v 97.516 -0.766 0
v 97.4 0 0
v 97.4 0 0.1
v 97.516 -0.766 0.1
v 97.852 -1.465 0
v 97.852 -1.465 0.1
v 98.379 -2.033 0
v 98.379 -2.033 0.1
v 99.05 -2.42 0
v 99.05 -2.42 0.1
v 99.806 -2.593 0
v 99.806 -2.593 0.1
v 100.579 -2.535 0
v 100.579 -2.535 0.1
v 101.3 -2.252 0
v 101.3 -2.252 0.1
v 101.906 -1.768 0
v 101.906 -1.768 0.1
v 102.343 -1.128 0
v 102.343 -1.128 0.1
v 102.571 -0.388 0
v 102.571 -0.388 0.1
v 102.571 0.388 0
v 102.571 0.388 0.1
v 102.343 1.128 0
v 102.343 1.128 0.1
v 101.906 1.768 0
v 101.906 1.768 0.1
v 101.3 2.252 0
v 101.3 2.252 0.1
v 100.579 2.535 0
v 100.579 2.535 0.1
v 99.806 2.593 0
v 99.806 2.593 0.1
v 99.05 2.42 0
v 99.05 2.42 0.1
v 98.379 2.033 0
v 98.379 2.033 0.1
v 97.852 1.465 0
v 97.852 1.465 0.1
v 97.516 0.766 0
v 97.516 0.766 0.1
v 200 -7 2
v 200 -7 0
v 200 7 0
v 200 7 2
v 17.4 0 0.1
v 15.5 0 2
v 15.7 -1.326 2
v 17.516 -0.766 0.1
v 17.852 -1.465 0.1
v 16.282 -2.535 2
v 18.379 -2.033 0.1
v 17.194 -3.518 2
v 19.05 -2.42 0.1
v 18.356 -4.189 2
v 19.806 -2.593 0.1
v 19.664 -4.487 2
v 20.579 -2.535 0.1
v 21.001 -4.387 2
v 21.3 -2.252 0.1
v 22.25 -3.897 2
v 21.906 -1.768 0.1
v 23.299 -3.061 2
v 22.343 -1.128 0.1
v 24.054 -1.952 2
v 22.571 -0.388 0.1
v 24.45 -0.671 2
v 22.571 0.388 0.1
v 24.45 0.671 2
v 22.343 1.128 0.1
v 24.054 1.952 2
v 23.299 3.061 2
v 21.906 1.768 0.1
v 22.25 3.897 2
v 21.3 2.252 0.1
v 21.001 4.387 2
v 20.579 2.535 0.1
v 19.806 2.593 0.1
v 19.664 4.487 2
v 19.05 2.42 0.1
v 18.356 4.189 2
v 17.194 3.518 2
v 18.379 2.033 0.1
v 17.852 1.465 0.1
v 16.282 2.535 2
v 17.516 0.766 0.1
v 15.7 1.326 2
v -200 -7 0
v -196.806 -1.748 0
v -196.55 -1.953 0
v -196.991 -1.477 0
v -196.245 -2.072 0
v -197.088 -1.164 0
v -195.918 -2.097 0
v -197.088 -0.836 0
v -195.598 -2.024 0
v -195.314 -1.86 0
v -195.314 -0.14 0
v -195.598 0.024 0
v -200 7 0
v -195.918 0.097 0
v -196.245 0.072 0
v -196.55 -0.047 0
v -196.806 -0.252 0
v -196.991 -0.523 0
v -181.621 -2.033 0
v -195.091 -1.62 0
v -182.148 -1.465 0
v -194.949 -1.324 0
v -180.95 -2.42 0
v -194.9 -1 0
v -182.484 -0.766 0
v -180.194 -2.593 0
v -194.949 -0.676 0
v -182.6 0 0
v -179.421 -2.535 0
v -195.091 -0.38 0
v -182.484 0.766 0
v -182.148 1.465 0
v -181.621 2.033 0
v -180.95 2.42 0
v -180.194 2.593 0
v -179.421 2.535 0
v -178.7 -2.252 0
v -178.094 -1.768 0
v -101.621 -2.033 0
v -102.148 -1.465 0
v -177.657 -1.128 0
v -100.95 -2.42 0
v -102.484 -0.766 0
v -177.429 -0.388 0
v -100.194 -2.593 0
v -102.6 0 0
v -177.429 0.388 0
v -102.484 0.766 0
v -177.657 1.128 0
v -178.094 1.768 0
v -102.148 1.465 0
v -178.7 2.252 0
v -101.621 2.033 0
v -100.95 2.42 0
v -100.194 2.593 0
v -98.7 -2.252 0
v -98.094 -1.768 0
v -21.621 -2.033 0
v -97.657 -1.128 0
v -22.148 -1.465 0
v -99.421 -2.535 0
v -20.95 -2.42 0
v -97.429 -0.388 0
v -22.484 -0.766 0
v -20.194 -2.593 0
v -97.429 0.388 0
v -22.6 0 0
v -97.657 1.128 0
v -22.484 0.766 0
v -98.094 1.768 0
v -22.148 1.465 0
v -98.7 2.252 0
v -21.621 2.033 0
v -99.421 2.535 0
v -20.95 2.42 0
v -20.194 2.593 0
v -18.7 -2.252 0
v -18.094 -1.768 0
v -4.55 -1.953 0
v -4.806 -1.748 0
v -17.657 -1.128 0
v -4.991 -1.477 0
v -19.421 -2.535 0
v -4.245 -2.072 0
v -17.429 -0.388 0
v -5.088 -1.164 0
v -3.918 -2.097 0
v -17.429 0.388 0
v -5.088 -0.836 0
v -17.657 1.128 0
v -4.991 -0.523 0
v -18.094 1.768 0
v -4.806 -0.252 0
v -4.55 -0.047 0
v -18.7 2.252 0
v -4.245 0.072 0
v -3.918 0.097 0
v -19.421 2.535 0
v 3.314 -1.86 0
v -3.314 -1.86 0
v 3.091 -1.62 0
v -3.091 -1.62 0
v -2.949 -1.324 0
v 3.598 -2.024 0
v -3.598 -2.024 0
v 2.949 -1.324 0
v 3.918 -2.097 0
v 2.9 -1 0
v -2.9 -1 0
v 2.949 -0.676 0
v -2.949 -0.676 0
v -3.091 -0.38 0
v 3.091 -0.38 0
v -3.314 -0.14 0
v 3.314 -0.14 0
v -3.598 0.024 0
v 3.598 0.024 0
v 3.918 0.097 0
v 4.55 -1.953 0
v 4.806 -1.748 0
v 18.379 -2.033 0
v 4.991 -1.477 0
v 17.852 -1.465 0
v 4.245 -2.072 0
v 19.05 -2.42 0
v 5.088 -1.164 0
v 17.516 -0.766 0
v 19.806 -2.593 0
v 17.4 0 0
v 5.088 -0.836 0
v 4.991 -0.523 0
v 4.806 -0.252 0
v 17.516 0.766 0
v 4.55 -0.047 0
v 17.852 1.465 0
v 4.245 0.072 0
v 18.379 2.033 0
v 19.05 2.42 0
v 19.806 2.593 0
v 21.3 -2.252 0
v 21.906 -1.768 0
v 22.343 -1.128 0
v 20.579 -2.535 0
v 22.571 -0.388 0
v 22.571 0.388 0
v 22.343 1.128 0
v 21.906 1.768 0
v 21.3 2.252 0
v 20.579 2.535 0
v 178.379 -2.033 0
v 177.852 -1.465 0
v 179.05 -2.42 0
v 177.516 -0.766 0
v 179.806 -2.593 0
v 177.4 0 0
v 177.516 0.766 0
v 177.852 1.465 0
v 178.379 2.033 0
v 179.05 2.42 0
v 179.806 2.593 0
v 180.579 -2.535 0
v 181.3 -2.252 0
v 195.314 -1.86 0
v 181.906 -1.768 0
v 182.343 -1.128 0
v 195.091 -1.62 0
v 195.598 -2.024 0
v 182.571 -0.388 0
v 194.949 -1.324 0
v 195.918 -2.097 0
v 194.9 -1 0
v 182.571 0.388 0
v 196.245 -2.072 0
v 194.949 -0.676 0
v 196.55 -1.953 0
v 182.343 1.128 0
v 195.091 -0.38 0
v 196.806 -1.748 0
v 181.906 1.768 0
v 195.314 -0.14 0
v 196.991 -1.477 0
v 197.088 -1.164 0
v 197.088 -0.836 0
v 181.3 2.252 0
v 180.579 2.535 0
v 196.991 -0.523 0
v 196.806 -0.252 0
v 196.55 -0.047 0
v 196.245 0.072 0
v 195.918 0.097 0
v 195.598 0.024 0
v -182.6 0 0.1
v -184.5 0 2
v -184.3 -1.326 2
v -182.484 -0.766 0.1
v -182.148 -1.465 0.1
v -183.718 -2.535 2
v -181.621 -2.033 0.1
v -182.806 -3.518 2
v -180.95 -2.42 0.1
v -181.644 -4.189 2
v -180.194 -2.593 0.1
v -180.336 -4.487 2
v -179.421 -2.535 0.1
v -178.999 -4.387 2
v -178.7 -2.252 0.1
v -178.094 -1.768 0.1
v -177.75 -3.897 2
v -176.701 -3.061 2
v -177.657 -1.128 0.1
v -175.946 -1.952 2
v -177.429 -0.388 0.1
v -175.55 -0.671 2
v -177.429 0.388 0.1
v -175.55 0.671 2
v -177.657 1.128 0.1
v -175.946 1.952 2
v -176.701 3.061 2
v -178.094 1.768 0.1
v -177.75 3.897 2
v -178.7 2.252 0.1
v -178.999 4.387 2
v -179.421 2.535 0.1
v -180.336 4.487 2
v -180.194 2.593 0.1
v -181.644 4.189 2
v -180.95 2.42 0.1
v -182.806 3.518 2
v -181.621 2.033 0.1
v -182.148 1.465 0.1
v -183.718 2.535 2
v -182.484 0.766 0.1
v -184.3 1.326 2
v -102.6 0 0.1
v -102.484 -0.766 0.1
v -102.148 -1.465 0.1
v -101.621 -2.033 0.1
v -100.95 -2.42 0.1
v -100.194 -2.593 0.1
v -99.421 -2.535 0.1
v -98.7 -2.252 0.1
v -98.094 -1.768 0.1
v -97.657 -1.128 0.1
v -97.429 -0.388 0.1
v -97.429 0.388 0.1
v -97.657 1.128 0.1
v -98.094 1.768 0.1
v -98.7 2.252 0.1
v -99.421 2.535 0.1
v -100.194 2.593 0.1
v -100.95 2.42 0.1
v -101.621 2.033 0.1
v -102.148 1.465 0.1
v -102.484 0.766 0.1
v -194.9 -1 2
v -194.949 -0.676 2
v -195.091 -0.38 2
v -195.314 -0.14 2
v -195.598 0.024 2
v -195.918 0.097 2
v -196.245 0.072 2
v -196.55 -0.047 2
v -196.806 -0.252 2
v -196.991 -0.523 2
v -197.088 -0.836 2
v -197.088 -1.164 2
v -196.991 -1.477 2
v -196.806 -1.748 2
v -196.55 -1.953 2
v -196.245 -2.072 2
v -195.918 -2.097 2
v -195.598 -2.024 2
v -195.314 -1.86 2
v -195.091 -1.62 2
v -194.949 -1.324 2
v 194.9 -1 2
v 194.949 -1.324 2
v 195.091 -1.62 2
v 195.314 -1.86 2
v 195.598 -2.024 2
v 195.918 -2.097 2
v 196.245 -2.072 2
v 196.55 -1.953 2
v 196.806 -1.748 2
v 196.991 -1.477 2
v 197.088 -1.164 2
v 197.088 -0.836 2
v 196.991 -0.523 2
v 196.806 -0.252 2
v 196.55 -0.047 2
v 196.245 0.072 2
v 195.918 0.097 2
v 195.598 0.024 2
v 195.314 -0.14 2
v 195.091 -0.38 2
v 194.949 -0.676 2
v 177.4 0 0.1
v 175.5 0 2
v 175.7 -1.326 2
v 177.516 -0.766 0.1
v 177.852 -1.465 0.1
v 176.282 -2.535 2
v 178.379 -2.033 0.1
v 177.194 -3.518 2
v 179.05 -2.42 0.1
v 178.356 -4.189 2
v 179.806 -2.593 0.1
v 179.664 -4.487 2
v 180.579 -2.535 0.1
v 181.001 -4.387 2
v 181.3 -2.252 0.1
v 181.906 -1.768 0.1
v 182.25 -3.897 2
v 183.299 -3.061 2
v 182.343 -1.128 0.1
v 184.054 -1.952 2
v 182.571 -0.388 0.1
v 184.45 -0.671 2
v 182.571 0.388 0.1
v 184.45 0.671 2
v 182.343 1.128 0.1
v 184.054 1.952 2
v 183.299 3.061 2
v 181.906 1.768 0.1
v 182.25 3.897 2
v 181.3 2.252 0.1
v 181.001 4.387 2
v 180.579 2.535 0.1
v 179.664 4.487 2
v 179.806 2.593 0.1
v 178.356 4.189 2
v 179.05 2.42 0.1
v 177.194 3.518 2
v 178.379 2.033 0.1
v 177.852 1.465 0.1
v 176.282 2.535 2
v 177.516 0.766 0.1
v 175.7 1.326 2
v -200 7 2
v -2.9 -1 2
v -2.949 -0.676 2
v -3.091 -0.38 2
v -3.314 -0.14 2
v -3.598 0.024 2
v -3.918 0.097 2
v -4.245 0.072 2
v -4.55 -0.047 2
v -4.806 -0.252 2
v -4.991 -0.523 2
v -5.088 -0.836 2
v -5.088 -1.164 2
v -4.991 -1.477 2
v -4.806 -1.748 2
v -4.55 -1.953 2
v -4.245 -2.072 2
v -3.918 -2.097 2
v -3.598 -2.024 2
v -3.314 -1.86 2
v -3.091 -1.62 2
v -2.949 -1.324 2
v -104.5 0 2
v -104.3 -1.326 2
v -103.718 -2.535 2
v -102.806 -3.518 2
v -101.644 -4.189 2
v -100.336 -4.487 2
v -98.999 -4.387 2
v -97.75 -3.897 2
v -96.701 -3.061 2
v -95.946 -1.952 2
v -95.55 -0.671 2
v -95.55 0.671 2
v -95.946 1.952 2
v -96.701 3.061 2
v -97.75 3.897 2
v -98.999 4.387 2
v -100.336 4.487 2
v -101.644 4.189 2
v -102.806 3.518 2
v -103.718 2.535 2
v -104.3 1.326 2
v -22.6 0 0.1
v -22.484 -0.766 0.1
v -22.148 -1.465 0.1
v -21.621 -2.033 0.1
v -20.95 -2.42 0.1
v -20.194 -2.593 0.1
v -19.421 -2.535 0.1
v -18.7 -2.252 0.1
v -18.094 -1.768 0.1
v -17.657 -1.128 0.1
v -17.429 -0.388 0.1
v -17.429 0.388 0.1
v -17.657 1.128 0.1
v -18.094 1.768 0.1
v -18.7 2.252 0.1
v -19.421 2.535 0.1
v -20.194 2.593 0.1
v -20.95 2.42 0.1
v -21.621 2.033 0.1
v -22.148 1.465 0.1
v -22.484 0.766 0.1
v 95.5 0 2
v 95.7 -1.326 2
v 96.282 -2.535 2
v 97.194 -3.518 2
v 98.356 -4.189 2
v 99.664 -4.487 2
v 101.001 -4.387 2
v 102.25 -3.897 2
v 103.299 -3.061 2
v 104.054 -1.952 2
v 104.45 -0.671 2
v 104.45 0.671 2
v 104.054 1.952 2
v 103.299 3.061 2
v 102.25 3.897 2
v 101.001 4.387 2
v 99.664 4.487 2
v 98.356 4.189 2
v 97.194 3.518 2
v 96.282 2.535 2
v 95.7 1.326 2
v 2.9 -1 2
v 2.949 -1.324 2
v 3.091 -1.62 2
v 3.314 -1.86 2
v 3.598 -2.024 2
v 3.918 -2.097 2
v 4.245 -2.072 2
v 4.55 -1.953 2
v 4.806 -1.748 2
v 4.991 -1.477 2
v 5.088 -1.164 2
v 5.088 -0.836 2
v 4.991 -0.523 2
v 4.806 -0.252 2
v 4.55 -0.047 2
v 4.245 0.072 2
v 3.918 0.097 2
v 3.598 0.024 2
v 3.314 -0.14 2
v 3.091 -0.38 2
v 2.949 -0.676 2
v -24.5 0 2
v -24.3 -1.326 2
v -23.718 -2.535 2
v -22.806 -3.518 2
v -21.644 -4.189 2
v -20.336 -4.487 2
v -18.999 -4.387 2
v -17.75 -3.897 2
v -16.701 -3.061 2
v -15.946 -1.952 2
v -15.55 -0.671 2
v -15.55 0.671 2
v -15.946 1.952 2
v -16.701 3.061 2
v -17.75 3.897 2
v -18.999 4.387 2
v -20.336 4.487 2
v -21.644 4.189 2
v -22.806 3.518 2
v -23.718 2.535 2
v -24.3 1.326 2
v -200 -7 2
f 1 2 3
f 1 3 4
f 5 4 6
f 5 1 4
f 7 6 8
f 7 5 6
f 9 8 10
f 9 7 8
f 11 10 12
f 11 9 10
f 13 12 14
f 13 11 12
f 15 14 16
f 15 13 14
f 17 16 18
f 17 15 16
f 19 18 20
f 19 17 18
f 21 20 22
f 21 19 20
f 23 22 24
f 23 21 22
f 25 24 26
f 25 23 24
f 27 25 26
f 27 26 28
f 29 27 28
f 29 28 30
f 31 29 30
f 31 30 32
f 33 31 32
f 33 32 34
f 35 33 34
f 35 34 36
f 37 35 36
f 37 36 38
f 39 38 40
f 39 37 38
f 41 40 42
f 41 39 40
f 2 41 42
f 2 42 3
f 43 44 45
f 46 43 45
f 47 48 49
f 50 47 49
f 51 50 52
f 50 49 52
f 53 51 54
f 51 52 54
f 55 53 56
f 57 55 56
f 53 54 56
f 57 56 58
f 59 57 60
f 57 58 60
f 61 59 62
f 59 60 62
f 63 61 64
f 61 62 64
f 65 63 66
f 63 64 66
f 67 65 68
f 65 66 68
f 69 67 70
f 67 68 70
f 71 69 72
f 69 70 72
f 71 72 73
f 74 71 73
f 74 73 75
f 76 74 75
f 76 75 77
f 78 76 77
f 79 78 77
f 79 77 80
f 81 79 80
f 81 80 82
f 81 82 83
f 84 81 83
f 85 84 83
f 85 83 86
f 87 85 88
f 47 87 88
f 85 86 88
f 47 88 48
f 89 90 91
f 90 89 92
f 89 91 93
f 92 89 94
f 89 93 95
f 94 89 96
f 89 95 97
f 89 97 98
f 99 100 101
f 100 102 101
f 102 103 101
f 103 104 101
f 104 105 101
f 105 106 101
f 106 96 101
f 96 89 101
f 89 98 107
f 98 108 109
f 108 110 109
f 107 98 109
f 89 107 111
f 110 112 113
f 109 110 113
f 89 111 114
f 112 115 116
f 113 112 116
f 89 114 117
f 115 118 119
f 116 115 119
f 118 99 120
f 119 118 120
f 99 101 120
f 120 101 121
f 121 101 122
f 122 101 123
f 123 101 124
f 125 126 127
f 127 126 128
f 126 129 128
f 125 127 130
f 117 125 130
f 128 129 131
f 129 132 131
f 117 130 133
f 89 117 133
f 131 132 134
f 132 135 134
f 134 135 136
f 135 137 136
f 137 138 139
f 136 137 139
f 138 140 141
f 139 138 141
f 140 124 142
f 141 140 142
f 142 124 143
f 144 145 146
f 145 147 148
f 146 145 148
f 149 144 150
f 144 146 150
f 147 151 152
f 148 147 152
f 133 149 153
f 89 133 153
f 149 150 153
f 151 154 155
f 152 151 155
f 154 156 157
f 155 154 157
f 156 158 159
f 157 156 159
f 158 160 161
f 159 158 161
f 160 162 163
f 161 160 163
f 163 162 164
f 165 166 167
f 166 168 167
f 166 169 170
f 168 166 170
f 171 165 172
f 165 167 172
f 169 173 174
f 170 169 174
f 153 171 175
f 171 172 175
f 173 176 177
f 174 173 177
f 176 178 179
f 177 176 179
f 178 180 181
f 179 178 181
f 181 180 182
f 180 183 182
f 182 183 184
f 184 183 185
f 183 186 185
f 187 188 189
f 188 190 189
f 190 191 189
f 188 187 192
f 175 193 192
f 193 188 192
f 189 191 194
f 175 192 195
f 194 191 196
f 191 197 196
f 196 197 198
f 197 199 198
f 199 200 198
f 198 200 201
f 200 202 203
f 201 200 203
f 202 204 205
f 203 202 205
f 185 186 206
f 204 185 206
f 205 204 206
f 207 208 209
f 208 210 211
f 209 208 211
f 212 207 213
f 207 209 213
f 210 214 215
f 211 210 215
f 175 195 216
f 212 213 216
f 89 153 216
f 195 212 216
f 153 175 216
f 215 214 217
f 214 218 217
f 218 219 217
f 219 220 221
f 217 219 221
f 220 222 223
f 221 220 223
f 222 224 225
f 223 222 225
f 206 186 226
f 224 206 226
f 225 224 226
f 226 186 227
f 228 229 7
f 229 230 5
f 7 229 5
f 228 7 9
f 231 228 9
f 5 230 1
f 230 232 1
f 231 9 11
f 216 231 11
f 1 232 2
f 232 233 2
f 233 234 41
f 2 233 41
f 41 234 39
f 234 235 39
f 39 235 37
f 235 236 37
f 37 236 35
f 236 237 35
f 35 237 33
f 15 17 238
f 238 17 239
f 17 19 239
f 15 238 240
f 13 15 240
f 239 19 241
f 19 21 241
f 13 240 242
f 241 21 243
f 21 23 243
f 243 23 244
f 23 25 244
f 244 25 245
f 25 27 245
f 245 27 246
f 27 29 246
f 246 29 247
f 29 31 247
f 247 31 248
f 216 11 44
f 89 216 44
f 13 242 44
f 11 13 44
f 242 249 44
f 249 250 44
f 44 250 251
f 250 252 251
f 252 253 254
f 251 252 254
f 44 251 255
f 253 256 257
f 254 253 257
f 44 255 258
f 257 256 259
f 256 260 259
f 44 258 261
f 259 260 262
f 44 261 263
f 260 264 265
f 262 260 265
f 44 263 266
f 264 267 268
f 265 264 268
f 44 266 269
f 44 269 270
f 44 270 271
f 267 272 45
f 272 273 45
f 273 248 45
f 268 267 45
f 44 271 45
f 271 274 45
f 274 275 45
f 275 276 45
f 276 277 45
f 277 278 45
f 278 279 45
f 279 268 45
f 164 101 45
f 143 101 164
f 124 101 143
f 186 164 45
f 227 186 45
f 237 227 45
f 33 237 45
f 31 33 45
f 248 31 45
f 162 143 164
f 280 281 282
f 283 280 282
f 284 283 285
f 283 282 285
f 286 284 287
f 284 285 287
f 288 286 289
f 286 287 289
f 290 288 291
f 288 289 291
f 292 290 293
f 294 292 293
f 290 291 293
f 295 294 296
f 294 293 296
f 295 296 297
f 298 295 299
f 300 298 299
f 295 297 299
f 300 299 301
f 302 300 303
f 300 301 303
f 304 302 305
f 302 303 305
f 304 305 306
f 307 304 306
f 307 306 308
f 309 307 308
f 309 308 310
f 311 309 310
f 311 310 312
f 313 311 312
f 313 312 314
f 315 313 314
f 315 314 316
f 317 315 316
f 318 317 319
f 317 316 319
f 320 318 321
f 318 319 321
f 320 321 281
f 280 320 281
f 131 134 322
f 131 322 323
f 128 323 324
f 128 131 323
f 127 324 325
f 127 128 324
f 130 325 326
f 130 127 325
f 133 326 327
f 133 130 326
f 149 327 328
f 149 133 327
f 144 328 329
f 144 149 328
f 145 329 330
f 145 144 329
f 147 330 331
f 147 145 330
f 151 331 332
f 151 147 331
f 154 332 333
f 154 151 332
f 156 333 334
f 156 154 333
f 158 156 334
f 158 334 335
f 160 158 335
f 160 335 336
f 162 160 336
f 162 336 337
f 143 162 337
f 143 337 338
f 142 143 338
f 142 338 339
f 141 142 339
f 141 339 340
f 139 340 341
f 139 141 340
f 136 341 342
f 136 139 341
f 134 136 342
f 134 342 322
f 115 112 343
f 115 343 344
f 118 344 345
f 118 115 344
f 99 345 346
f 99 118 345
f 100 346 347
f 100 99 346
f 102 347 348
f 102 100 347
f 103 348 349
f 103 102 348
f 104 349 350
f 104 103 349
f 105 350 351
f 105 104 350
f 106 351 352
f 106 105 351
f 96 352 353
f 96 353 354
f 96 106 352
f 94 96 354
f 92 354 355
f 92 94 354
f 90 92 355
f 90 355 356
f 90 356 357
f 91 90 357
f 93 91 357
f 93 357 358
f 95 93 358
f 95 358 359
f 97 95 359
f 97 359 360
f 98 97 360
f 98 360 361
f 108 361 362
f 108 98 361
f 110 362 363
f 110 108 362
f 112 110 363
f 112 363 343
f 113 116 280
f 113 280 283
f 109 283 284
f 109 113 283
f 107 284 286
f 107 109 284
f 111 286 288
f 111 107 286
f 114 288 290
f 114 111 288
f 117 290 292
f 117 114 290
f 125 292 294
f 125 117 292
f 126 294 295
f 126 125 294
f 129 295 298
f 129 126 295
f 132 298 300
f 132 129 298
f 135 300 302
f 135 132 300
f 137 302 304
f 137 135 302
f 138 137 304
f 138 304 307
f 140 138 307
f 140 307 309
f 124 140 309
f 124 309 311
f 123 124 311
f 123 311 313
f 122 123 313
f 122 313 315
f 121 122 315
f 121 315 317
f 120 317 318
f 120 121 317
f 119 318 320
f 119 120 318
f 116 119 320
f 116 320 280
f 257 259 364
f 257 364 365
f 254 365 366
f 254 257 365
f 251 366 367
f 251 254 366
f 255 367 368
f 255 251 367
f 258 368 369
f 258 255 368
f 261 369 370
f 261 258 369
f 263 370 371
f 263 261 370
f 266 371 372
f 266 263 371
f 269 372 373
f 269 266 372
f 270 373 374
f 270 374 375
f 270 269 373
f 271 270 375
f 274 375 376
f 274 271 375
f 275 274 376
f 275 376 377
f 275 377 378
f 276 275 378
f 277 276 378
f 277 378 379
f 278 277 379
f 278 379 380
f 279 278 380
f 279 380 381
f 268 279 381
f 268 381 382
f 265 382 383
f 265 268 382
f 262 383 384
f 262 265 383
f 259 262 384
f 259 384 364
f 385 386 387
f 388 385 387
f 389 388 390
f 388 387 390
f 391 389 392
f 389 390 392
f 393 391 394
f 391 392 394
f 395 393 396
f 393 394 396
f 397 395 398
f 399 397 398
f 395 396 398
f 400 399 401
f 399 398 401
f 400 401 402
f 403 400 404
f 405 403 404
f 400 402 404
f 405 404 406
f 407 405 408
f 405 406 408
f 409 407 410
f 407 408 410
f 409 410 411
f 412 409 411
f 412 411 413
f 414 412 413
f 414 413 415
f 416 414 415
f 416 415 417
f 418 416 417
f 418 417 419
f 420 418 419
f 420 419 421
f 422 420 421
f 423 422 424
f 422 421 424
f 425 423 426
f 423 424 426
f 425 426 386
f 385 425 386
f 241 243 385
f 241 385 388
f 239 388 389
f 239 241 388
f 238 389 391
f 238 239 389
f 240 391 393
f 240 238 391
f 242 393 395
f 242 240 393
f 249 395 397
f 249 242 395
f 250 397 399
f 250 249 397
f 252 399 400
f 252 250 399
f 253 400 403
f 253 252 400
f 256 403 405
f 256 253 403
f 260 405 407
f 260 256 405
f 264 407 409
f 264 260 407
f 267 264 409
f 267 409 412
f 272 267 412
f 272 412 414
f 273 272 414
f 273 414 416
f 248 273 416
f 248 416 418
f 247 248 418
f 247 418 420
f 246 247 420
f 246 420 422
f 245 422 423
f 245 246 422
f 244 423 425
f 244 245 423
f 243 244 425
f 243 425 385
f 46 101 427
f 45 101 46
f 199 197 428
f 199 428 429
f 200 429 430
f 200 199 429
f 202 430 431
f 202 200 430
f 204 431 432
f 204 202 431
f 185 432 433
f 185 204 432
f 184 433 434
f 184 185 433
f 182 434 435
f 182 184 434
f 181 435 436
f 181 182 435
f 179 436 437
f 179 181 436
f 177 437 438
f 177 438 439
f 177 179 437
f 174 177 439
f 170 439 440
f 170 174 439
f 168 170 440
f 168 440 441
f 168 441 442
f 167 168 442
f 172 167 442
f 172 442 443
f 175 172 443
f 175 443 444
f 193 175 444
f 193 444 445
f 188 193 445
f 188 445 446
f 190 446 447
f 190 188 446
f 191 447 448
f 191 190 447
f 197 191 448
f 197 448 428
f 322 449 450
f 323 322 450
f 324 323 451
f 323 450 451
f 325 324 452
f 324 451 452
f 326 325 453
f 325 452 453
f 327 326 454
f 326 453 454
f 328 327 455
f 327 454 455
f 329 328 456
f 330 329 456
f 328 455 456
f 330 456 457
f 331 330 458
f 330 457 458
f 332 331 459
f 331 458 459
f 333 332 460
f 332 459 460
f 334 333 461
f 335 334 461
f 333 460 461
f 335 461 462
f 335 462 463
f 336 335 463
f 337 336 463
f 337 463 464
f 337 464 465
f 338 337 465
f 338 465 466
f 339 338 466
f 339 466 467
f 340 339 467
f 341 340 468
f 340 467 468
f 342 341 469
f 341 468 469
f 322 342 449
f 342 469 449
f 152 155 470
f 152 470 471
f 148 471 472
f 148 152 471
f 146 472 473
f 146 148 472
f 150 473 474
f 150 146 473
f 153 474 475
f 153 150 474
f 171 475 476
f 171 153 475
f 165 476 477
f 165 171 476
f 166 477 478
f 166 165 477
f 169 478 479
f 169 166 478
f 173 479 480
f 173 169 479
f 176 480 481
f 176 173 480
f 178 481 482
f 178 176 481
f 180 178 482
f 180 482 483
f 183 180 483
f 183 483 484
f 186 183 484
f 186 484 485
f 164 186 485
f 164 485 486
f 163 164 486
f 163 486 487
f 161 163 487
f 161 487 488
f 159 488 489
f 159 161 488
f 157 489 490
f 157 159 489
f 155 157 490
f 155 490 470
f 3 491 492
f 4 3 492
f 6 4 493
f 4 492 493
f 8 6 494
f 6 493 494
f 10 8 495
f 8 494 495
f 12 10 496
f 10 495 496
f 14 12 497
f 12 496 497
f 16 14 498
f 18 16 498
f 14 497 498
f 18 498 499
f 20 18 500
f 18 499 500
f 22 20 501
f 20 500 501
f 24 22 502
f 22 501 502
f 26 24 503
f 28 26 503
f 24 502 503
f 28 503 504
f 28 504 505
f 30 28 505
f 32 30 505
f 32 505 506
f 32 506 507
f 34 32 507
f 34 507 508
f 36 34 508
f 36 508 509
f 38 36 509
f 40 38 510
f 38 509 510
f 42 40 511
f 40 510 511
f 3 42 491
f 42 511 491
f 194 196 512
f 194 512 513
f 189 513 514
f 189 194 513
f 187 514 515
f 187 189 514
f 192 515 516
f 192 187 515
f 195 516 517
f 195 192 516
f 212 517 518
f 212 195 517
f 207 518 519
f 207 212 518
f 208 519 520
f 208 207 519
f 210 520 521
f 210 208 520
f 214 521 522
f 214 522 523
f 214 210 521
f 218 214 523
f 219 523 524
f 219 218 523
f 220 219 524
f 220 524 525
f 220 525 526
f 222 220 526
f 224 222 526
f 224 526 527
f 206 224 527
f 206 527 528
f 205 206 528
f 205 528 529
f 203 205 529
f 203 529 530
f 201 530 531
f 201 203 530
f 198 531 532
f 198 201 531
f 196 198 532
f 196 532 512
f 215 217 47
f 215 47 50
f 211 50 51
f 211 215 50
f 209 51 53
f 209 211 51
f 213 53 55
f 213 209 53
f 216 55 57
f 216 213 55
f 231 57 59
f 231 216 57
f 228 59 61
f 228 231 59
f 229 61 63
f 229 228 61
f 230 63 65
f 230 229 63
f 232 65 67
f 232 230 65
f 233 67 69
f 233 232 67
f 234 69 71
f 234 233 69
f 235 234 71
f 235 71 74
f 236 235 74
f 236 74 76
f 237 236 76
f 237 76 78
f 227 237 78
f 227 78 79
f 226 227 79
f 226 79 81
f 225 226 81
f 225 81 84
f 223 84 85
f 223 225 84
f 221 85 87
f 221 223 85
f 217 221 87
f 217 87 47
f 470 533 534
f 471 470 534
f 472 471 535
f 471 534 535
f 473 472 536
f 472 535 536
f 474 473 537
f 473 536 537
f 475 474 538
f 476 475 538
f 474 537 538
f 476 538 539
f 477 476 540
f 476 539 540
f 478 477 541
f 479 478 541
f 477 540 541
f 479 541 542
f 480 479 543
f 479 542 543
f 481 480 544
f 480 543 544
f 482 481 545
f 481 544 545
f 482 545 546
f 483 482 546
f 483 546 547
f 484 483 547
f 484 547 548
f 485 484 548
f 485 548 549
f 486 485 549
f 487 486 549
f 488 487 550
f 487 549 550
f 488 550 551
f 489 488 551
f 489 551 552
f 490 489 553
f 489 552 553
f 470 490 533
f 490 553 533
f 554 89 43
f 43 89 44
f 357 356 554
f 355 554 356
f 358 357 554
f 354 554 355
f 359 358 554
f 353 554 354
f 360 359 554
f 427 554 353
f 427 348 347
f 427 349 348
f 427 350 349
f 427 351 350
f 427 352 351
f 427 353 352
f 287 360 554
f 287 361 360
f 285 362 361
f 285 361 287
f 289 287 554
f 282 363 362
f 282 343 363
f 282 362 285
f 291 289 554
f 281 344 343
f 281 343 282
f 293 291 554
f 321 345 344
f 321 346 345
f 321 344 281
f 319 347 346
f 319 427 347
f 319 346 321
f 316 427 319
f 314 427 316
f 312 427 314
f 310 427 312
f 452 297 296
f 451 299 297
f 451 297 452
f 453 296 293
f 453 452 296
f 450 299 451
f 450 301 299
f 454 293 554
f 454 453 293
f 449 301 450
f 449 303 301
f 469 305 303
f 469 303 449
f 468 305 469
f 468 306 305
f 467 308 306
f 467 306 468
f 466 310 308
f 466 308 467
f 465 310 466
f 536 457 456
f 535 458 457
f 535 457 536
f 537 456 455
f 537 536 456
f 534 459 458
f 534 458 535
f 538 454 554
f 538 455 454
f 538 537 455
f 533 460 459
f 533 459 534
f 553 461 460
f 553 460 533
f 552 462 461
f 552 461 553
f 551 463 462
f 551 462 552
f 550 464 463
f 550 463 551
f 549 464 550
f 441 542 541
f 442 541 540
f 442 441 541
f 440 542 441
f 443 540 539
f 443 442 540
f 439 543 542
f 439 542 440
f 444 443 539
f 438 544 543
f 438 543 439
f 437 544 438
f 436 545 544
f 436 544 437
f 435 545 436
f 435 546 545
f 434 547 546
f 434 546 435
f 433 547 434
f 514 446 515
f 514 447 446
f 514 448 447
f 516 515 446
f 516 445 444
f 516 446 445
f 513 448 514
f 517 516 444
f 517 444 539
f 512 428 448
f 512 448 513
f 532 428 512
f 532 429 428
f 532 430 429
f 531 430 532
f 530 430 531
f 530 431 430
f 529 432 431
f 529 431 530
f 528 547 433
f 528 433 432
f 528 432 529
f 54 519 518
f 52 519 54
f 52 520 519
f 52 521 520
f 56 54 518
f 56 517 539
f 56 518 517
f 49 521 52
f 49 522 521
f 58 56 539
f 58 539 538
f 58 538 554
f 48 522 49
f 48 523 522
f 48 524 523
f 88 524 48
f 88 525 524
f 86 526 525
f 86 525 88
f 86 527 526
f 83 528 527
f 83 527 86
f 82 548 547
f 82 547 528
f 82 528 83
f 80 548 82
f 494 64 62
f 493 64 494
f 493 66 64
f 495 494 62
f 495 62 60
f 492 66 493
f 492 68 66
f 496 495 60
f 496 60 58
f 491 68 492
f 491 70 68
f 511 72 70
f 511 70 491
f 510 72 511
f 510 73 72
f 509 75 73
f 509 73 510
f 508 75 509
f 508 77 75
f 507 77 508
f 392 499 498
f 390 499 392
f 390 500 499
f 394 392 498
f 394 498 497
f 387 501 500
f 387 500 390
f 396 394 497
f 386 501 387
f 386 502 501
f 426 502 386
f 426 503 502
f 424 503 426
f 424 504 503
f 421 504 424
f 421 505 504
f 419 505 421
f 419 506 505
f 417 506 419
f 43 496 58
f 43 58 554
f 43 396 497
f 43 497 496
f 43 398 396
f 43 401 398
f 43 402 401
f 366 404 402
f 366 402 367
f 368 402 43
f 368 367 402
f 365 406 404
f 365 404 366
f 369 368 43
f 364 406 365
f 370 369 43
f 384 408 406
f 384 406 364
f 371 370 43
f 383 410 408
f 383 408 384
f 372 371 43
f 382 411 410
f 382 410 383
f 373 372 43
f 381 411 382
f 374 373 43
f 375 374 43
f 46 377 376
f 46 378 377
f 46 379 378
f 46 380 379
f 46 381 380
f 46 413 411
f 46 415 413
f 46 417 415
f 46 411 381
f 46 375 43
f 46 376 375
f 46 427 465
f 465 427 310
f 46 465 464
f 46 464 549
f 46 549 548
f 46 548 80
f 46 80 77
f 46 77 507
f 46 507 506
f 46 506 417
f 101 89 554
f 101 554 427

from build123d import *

# Parameters (mm, degrees)
SKETCH_1_W      = 400
SKETCH_1_H      = 14
SKETCH_1_R      = 2.6
SKETCH_1_R_2    = 1.1
EXTRUDE_1_DEPTH = 2
CHAMFER_1_SIZE  = 1.9


with BuildPart() as part:
    # Эскиз1 → Вытянуть1 (new body)
    with BuildSketch(Plane.XY):
        Rectangle(SKETCH_1_W, SKETCH_1_H)
        with Locations(Location((-180, 0, 0), (0, 0, 180))):
            Circle(SKETCH_1_R, mode=Mode.SUBTRACT)
        with Locations(Location((-100, 0, 0), (0, 0, 180))):
            Circle(SKETCH_1_R, mode=Mode.SUBTRACT)
        with Locations(Location((-20, 0, 0), (0, 0, 180))):
            Circle(SKETCH_1_R, mode=Mode.SUBTRACT)
        with Locations(Location((20, 0, 0), (0, 0, 180))):
            Circle(SKETCH_1_R, mode=Mode.SUBTRACT)
        with Locations(Location((100, 0, 0), (0, 0, 180))):
            Circle(SKETCH_1_R, mode=Mode.SUBTRACT)
        with Locations(Location((180, 0, 0), (0, 0, 180))):
            Circle(SKETCH_1_R, mode=Mode.SUBTRACT)
        with Locations((-196, -1)):
            Circle(SKETCH_1_R_2, mode=Mode.SUBTRACT)
        with Locations((-4, -1)):
            Circle(SKETCH_1_R_2, mode=Mode.SUBTRACT)
        with Locations(Location((4, -1, 0), (0, 0, 180))):
            Circle(SKETCH_1_R_2, mode=Mode.SUBTRACT)
        with Locations(Location((196, -1, 0), (0, 0, 180))):
            Circle(SKETCH_1_R_2, mode=Mode.SUBTRACT)
    extrude(amount=EXTRUDE_1_DEPTH)

    # Фаска1
    chamfer_1_edges = [part.edges().sort_by_distance(p)[0] for p in [
        (-177.4, 0, 2),
        (-97.4, 0, 2),
        (-17.4, 0, 2),
        (22.6, 0, 2),
        (102.6, 0, 2),
        (182.6, 0, 2),
    ]]
    chamfer(chamfer_1_edges, length=CHAMFER_1_SIZE)


solid = part.part
